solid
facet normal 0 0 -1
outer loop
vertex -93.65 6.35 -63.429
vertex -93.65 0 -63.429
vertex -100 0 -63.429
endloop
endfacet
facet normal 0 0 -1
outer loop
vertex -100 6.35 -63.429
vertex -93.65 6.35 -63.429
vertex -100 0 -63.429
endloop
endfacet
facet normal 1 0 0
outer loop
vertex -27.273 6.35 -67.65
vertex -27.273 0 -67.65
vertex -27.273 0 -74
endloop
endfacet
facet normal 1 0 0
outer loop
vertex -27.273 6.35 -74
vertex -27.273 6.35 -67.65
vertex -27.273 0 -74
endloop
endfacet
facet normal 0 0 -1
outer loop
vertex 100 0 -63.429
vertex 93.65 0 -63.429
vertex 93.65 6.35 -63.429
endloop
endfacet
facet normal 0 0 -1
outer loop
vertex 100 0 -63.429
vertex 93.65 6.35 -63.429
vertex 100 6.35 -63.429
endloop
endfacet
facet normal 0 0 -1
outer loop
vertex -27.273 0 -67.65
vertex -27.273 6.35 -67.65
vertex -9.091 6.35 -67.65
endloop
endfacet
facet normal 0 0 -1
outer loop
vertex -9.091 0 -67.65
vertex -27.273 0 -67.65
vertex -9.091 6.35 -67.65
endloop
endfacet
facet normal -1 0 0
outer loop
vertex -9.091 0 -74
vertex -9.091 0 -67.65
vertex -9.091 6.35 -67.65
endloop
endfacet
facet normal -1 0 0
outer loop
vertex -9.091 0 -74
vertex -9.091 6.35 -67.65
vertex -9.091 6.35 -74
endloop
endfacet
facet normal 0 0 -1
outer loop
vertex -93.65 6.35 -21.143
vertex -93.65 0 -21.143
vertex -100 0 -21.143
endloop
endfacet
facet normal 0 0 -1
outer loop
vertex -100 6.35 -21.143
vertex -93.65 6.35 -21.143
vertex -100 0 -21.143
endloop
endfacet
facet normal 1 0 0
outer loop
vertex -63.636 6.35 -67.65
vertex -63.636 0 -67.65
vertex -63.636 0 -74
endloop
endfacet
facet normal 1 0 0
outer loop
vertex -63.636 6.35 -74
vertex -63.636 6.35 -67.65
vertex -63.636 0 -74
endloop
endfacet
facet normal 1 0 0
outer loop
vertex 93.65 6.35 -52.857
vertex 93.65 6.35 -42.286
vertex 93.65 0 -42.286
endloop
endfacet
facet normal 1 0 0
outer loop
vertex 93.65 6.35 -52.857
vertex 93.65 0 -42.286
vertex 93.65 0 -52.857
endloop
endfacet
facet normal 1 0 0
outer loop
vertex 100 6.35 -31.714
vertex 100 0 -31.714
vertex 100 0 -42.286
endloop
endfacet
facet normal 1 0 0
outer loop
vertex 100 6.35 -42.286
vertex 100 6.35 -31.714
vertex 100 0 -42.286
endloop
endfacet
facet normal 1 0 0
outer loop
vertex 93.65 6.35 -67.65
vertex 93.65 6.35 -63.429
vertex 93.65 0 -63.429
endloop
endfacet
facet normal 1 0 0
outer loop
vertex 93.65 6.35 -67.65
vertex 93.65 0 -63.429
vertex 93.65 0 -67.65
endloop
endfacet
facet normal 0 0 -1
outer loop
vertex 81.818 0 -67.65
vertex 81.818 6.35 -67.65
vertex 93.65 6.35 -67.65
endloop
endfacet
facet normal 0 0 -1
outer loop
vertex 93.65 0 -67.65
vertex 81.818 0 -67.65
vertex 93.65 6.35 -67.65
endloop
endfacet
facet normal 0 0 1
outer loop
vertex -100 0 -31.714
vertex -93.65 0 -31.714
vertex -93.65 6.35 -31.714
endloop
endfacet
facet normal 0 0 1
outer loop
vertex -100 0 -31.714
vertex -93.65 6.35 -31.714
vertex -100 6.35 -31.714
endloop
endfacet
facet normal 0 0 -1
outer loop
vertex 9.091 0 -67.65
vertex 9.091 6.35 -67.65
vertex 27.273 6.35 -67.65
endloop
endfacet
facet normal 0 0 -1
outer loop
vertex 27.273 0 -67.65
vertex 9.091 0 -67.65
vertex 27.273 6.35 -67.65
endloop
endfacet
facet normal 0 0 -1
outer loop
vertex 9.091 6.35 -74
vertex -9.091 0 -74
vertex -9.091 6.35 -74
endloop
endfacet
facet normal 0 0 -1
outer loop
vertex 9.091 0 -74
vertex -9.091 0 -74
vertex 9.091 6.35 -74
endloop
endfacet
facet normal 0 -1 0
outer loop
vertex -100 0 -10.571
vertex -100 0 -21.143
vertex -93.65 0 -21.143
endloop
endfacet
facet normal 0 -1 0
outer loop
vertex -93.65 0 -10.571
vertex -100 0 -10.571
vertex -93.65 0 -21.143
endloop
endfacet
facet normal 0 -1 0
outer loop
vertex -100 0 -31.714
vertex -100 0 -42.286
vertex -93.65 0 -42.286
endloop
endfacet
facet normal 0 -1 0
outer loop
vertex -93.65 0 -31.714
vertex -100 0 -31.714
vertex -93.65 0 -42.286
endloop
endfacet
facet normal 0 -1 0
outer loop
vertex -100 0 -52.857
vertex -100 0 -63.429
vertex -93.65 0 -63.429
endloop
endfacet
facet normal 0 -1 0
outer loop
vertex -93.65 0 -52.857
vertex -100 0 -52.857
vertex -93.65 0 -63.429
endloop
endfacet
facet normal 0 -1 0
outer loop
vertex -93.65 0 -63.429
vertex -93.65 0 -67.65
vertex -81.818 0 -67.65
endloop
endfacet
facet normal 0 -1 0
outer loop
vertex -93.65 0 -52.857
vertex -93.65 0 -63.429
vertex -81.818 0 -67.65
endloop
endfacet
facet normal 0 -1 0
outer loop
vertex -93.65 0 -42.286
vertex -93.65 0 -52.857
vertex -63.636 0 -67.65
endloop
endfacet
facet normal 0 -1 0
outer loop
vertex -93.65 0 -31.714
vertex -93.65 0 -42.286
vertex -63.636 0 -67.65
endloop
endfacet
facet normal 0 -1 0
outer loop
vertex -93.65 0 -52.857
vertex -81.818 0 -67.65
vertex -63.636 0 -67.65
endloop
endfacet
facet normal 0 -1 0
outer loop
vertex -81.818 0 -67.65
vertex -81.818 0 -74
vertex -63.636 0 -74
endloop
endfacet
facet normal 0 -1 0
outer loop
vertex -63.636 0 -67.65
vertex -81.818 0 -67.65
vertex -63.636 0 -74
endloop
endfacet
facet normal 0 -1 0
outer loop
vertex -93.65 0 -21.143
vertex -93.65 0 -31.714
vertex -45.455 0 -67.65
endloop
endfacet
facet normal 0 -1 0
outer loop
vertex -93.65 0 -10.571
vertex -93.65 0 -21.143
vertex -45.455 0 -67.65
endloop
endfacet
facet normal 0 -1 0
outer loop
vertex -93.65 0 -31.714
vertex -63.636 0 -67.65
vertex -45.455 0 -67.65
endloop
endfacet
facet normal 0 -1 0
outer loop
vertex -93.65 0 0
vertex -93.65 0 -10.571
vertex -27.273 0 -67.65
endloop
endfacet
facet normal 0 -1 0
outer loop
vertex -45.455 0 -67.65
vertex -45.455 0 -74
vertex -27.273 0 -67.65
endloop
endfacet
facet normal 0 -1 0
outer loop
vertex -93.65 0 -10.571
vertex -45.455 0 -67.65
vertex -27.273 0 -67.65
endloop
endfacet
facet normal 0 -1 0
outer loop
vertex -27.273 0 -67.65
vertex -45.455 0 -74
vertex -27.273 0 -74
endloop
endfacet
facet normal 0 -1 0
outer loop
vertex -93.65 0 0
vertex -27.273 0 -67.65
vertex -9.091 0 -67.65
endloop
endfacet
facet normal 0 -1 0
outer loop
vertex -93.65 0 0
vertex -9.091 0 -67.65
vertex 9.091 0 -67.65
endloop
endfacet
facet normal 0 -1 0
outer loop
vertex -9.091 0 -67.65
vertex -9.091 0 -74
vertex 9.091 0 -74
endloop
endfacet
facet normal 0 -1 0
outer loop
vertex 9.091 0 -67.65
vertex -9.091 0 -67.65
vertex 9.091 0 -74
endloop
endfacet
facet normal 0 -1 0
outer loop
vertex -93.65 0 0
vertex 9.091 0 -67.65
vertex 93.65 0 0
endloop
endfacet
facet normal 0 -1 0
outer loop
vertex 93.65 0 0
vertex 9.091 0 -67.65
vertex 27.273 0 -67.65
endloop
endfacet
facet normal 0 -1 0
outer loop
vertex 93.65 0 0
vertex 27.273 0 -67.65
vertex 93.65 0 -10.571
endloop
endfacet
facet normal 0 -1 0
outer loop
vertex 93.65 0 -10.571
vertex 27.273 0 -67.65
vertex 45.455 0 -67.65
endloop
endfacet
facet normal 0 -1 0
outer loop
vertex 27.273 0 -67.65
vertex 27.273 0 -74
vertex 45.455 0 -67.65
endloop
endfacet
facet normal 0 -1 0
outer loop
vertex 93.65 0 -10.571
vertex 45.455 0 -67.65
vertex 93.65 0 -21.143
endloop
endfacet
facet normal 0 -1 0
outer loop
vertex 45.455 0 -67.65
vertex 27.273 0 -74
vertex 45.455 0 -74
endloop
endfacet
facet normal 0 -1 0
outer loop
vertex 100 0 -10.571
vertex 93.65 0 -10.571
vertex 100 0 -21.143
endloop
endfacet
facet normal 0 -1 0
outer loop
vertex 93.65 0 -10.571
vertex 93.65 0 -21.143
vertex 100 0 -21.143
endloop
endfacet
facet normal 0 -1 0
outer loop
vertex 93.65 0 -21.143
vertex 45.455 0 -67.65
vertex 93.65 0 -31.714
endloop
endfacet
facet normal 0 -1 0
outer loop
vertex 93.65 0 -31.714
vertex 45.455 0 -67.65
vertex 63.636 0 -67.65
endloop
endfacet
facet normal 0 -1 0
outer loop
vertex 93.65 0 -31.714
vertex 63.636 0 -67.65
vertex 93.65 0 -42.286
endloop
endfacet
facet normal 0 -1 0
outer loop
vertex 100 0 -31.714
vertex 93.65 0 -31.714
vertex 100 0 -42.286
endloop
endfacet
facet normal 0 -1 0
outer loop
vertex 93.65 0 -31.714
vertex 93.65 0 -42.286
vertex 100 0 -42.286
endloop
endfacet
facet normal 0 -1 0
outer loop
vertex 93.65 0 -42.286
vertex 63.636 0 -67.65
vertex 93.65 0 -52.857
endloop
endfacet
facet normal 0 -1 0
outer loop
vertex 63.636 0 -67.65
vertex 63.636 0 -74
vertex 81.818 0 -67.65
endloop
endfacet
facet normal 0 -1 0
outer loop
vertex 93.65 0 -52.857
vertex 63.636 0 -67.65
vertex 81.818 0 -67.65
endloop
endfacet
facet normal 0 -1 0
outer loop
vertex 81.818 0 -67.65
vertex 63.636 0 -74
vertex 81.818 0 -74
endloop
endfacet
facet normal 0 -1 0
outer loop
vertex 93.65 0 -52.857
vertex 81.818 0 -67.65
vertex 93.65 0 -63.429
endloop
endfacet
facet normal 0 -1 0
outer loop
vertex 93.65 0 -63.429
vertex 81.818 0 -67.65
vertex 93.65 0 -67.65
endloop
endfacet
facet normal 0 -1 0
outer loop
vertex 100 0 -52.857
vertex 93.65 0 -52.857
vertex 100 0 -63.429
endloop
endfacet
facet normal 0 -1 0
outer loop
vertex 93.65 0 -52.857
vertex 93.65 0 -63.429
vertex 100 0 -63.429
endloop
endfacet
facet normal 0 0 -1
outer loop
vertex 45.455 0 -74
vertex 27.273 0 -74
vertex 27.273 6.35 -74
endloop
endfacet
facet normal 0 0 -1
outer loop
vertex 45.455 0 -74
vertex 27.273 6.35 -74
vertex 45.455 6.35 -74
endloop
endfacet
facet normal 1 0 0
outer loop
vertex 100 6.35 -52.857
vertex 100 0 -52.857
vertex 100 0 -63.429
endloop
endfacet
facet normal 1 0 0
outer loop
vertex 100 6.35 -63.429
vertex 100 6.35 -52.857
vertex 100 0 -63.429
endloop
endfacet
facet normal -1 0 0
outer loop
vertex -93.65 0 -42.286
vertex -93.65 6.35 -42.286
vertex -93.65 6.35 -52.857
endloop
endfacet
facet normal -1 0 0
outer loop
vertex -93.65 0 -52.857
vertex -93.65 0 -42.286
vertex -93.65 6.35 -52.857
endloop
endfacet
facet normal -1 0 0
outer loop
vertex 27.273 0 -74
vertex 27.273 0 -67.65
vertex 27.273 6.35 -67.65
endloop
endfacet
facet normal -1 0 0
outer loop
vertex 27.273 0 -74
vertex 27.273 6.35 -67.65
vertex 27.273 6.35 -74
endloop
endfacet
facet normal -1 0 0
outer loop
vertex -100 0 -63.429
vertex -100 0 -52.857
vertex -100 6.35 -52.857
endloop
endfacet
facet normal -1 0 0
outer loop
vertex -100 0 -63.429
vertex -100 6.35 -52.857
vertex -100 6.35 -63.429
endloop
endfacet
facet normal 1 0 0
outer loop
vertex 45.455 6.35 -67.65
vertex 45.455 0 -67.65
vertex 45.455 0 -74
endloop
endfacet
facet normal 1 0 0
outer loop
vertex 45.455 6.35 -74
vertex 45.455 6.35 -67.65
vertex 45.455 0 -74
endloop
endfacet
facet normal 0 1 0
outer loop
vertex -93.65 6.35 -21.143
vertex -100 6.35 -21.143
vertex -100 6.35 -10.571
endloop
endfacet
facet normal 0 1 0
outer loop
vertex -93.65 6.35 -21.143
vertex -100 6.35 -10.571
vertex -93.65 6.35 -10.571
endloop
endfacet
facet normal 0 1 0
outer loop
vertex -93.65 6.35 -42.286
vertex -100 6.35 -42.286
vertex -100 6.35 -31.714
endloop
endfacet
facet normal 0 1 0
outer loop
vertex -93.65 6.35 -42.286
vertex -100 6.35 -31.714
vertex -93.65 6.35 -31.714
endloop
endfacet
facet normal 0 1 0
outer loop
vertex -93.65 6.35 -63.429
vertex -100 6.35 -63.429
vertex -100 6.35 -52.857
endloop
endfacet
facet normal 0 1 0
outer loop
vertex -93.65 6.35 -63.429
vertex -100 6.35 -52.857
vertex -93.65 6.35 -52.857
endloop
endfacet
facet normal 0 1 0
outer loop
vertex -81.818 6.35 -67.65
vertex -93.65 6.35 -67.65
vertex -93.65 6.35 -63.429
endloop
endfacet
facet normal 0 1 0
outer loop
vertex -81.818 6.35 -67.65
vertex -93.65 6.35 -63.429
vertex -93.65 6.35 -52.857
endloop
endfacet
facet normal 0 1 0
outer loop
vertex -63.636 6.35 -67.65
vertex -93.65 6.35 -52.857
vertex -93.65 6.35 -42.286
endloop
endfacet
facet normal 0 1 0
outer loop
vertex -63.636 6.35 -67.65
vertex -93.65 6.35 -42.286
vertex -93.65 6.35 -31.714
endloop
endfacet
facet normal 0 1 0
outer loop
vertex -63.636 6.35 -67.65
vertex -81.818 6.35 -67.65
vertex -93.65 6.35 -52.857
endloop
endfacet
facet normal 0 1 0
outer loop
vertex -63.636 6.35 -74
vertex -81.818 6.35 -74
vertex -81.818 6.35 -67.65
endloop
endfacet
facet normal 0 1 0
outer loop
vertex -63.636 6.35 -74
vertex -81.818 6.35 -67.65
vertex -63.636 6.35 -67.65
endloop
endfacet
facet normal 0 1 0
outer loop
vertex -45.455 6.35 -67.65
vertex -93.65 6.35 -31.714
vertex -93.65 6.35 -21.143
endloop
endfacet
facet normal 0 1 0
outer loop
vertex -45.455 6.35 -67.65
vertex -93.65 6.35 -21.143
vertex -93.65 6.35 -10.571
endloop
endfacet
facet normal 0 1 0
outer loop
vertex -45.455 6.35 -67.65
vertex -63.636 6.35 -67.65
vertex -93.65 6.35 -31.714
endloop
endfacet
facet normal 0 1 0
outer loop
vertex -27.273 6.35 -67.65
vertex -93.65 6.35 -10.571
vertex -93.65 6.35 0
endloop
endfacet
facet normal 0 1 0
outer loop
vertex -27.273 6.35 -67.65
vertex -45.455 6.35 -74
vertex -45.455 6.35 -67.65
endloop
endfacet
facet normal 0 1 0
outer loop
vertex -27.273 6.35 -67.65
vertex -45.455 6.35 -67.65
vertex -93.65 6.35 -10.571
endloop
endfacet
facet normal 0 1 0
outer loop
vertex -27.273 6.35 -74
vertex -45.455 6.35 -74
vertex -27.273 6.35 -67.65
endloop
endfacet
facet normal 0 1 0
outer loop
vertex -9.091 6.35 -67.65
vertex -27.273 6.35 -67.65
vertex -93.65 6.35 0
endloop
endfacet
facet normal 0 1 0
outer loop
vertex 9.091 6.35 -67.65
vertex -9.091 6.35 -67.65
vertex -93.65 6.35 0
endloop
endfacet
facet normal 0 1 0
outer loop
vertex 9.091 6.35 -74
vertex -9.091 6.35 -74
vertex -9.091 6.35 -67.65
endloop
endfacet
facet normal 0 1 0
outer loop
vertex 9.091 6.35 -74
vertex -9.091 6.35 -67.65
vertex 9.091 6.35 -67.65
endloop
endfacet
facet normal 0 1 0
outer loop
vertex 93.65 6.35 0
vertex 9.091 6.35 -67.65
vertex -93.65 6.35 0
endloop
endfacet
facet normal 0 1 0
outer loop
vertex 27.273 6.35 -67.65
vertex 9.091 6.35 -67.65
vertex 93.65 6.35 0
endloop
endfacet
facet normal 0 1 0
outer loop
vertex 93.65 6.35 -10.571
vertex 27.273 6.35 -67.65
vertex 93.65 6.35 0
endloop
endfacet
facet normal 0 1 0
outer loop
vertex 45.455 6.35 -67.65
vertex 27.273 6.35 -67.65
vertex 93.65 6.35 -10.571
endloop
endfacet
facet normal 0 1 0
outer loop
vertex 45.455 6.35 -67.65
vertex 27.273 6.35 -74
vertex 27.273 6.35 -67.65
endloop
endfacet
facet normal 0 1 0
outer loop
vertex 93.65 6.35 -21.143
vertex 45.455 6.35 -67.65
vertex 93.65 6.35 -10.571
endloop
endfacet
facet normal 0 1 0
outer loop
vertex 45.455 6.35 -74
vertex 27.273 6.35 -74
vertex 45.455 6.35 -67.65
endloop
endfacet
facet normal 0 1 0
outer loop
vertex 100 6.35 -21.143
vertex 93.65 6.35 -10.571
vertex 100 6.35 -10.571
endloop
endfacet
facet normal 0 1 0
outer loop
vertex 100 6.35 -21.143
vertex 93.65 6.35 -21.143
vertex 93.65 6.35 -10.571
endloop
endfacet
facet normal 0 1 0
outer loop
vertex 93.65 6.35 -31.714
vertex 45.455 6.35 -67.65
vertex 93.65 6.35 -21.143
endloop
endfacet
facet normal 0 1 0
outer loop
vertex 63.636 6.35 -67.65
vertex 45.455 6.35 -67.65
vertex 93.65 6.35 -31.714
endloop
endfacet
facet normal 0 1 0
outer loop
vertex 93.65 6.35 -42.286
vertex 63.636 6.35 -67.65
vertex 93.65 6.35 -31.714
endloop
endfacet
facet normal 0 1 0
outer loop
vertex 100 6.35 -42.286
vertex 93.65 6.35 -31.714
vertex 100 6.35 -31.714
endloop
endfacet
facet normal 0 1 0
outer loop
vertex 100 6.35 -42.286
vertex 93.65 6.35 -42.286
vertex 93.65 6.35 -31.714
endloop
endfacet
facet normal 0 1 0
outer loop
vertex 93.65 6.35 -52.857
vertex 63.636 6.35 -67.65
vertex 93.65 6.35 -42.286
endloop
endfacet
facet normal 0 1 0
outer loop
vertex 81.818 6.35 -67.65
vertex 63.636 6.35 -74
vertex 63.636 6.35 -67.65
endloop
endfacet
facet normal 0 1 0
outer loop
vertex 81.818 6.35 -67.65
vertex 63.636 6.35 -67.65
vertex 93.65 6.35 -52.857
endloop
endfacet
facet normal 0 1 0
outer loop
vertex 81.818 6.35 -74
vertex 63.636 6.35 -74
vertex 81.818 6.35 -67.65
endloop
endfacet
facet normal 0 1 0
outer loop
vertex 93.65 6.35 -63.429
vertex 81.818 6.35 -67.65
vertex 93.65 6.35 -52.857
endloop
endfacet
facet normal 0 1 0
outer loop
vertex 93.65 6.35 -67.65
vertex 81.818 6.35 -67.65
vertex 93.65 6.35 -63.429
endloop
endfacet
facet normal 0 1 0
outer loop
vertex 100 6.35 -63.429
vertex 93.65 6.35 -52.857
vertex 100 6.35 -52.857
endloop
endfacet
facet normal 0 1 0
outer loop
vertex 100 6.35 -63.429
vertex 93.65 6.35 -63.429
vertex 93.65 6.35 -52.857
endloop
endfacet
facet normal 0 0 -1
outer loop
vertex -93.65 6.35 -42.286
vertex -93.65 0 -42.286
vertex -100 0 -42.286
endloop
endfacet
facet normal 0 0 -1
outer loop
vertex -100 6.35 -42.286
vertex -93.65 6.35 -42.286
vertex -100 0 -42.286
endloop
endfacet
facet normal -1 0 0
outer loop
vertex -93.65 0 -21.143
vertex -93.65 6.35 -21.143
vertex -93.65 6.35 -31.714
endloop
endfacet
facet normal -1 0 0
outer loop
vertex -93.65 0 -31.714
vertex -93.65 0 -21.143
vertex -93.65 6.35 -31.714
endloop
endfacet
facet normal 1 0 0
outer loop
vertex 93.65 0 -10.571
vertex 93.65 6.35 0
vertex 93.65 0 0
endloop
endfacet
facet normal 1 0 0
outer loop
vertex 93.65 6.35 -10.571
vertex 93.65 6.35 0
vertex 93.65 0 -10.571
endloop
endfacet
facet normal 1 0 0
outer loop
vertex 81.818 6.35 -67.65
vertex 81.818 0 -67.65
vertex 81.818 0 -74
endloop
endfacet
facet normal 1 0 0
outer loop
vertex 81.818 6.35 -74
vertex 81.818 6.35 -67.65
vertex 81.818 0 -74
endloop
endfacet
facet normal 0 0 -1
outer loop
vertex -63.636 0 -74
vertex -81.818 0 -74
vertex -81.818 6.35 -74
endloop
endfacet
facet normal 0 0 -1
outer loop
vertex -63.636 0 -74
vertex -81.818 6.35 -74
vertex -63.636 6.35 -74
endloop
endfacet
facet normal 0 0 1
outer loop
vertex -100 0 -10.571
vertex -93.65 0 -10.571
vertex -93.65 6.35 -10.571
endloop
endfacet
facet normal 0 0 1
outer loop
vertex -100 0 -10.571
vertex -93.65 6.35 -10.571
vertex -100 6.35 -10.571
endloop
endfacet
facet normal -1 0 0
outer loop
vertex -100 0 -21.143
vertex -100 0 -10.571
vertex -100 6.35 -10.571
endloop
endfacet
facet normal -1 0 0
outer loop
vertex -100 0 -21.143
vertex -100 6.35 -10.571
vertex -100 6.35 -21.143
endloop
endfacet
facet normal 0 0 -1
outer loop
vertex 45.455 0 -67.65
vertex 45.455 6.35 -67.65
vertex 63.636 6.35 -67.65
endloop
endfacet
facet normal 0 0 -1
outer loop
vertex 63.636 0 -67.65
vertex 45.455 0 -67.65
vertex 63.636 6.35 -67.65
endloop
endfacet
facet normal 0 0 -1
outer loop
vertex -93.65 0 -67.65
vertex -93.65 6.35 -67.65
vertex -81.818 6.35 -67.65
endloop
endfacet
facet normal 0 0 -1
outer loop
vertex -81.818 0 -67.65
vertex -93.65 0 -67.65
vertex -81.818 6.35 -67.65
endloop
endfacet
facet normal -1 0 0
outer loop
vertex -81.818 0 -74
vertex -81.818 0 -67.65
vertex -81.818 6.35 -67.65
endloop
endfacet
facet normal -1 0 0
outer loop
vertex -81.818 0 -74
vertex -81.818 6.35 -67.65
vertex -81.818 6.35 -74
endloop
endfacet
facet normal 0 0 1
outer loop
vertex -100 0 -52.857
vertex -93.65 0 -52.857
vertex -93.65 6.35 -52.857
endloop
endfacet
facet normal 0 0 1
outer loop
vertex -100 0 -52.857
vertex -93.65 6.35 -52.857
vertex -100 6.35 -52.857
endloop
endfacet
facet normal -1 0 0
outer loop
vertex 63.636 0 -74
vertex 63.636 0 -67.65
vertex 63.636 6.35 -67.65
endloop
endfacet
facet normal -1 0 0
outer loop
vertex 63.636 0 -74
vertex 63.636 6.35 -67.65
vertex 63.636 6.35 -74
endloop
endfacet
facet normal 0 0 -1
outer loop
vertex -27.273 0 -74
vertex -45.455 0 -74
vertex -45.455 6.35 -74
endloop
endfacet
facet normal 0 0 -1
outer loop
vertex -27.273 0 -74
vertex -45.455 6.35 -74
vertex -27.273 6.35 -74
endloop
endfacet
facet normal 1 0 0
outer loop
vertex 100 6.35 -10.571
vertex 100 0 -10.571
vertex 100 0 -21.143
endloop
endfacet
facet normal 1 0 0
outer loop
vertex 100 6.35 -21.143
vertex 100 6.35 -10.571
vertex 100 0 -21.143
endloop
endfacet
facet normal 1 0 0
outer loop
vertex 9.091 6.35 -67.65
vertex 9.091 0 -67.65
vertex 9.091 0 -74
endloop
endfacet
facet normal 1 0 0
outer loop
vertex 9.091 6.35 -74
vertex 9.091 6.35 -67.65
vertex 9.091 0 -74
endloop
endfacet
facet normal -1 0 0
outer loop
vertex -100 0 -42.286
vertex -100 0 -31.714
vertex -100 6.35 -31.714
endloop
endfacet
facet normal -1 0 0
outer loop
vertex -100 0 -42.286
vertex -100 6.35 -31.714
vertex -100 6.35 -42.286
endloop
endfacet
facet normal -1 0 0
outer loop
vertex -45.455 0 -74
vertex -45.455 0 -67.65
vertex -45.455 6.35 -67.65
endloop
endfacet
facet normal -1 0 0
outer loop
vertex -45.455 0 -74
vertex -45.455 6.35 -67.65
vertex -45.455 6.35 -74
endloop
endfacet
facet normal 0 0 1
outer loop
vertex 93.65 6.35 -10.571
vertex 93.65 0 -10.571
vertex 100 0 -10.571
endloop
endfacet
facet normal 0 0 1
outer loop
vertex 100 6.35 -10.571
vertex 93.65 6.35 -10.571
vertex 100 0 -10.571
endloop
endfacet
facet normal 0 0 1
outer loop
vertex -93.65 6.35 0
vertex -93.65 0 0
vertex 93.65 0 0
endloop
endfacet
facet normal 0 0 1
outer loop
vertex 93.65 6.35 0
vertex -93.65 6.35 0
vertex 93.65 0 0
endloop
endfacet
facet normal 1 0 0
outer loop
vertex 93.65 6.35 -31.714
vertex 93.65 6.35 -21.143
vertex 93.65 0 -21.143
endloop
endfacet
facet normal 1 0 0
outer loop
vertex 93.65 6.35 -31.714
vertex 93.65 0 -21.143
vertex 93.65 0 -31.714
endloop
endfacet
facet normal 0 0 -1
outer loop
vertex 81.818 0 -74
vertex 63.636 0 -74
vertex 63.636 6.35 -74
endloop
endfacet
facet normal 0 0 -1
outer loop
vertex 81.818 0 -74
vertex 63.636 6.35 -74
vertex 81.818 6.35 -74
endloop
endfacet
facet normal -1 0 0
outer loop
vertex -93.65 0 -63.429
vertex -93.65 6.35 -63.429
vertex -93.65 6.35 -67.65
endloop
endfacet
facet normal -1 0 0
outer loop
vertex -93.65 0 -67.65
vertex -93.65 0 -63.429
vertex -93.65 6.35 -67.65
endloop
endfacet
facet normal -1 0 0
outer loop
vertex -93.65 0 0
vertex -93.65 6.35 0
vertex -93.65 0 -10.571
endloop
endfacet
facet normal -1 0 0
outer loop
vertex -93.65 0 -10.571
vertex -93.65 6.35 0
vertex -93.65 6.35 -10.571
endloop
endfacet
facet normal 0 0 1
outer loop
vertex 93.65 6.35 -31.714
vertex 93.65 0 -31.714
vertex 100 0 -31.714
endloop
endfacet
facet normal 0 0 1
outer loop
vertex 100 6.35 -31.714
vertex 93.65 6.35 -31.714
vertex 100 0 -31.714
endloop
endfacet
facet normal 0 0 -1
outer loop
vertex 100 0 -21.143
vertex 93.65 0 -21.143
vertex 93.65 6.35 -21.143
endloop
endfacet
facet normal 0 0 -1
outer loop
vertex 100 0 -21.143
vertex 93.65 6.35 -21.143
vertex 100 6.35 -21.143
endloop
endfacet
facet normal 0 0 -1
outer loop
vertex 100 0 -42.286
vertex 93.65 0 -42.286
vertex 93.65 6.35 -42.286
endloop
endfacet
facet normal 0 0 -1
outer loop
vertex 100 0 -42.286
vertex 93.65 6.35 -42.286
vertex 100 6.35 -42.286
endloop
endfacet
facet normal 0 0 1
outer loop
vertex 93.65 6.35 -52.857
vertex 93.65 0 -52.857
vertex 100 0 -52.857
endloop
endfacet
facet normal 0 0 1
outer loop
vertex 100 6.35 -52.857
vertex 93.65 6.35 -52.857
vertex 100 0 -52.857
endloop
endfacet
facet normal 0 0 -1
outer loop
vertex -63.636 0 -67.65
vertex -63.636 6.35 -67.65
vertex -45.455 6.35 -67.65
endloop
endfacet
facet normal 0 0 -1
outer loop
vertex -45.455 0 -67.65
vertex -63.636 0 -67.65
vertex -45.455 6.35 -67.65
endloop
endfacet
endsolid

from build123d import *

# Parameters (mm, degrees)
ESQUISSE1_W             = 200
ESQUISSE1_H             = 74
BOSS_EXTRU_1_DEPTH      = 6.35
ESQUISSE2_W             = 6.35
ESQUISSE2_H             = 10.571428571
ENL_V_MAT_EXTRU_1_DEPTH = 6.35
ESQUISSE3_W             = 18.181818182
ESQUISSE3_H             = 6.35
ESQUISSE3_W_2           = 18.181818181
ENL_V_MAT_EXTRU_2_DEPTH = 6.35


with BuildPart() as part:
    # Esquisse1 → Boss.-Extru.1 (new body)
    with BuildSketch(Plane(origin=(0, 0, 0), x_dir=(1, 0, 0), z_dir=(0, 1, 0))):
        with Locations((0, 37)):
            Rectangle(ESQUISSE1_W, ESQUISSE1_H)
    extrude(amount=BOSS_EXTRU_1_DEPTH)

    # Esquisse2 → Enlèv. mat.-Extru.1 (cut)
    with BuildSketch(Plane(origin=(0, 6.35, 0), x_dir=(1, 0, 0), z_dir=(0, 1, 0))):
        with Locations((96.825, 68.714285714)):
            Rectangle(ESQUISSE2_W, ESQUISSE2_H)
        with Locations((96.825, 47.571428572)):
            Rectangle(ESQUISSE2_W, ESQUISSE2_H)
        with Locations((96.825, 26.428571428)):
            Rectangle(ESQUISSE2_W, ESQUISSE2_H)
        with Locations((96.825, 5.285714286)):
            Rectangle(ESQUISSE2_W, ESQUISSE2_H)
    enl_v_mat_extru_1 = extrude(amount=-ENL_V_MAT_EXTRU_1_DEPTH, mode=Mode.SUBTRACT)

    # Symétrie1: Enlèv. mat.-Extru.1 across plane
    add(enl_v_mat_extru_1.mirror(Plane(origin=(0, 0, 0), x_dir=(0, 0, 1), z_dir=(1, 0, 0))), mode=Mode.SUBTRACT)

    # Esquisse3 → Enlèv. mat.-Extru.2 (cut)
    with BuildSketch(Plane(origin=(0, 6.35, 0), x_dir=(1, 0, 0), z_dir=(0, 1, 0))):
        with Locations((-90.909090909, 70.825)):
            Rectangle(ESQUISSE3_W, ESQUISSE3_H)
        with Locations((-54.545454546, 70.825)):
            Rectangle(ESQUISSE3_W_2, ESQUISSE3_H)
        with Locations((-18.181818182, 70.825)):
            Rectangle(ESQUISSE3_W, ESQUISSE3_H)
        with Locations((18.181818182, 70.825)):
            Rectangle(ESQUISSE3_W, ESQUISSE3_H)
        with Locations((54.545454546, 70.825)):
            Rectangle(ESQUISSE3_W_2, ESQUISSE3_H)
        with Locations((90.909090909, 70.825)):
            Rectangle(ESQUISSE3_W, ESQUISSE3_H)
    extrude(amount=-ENL_V_MAT_EXTRU_2_DEPTH, mode=Mode.SUBTRACT)


solid = part.part
